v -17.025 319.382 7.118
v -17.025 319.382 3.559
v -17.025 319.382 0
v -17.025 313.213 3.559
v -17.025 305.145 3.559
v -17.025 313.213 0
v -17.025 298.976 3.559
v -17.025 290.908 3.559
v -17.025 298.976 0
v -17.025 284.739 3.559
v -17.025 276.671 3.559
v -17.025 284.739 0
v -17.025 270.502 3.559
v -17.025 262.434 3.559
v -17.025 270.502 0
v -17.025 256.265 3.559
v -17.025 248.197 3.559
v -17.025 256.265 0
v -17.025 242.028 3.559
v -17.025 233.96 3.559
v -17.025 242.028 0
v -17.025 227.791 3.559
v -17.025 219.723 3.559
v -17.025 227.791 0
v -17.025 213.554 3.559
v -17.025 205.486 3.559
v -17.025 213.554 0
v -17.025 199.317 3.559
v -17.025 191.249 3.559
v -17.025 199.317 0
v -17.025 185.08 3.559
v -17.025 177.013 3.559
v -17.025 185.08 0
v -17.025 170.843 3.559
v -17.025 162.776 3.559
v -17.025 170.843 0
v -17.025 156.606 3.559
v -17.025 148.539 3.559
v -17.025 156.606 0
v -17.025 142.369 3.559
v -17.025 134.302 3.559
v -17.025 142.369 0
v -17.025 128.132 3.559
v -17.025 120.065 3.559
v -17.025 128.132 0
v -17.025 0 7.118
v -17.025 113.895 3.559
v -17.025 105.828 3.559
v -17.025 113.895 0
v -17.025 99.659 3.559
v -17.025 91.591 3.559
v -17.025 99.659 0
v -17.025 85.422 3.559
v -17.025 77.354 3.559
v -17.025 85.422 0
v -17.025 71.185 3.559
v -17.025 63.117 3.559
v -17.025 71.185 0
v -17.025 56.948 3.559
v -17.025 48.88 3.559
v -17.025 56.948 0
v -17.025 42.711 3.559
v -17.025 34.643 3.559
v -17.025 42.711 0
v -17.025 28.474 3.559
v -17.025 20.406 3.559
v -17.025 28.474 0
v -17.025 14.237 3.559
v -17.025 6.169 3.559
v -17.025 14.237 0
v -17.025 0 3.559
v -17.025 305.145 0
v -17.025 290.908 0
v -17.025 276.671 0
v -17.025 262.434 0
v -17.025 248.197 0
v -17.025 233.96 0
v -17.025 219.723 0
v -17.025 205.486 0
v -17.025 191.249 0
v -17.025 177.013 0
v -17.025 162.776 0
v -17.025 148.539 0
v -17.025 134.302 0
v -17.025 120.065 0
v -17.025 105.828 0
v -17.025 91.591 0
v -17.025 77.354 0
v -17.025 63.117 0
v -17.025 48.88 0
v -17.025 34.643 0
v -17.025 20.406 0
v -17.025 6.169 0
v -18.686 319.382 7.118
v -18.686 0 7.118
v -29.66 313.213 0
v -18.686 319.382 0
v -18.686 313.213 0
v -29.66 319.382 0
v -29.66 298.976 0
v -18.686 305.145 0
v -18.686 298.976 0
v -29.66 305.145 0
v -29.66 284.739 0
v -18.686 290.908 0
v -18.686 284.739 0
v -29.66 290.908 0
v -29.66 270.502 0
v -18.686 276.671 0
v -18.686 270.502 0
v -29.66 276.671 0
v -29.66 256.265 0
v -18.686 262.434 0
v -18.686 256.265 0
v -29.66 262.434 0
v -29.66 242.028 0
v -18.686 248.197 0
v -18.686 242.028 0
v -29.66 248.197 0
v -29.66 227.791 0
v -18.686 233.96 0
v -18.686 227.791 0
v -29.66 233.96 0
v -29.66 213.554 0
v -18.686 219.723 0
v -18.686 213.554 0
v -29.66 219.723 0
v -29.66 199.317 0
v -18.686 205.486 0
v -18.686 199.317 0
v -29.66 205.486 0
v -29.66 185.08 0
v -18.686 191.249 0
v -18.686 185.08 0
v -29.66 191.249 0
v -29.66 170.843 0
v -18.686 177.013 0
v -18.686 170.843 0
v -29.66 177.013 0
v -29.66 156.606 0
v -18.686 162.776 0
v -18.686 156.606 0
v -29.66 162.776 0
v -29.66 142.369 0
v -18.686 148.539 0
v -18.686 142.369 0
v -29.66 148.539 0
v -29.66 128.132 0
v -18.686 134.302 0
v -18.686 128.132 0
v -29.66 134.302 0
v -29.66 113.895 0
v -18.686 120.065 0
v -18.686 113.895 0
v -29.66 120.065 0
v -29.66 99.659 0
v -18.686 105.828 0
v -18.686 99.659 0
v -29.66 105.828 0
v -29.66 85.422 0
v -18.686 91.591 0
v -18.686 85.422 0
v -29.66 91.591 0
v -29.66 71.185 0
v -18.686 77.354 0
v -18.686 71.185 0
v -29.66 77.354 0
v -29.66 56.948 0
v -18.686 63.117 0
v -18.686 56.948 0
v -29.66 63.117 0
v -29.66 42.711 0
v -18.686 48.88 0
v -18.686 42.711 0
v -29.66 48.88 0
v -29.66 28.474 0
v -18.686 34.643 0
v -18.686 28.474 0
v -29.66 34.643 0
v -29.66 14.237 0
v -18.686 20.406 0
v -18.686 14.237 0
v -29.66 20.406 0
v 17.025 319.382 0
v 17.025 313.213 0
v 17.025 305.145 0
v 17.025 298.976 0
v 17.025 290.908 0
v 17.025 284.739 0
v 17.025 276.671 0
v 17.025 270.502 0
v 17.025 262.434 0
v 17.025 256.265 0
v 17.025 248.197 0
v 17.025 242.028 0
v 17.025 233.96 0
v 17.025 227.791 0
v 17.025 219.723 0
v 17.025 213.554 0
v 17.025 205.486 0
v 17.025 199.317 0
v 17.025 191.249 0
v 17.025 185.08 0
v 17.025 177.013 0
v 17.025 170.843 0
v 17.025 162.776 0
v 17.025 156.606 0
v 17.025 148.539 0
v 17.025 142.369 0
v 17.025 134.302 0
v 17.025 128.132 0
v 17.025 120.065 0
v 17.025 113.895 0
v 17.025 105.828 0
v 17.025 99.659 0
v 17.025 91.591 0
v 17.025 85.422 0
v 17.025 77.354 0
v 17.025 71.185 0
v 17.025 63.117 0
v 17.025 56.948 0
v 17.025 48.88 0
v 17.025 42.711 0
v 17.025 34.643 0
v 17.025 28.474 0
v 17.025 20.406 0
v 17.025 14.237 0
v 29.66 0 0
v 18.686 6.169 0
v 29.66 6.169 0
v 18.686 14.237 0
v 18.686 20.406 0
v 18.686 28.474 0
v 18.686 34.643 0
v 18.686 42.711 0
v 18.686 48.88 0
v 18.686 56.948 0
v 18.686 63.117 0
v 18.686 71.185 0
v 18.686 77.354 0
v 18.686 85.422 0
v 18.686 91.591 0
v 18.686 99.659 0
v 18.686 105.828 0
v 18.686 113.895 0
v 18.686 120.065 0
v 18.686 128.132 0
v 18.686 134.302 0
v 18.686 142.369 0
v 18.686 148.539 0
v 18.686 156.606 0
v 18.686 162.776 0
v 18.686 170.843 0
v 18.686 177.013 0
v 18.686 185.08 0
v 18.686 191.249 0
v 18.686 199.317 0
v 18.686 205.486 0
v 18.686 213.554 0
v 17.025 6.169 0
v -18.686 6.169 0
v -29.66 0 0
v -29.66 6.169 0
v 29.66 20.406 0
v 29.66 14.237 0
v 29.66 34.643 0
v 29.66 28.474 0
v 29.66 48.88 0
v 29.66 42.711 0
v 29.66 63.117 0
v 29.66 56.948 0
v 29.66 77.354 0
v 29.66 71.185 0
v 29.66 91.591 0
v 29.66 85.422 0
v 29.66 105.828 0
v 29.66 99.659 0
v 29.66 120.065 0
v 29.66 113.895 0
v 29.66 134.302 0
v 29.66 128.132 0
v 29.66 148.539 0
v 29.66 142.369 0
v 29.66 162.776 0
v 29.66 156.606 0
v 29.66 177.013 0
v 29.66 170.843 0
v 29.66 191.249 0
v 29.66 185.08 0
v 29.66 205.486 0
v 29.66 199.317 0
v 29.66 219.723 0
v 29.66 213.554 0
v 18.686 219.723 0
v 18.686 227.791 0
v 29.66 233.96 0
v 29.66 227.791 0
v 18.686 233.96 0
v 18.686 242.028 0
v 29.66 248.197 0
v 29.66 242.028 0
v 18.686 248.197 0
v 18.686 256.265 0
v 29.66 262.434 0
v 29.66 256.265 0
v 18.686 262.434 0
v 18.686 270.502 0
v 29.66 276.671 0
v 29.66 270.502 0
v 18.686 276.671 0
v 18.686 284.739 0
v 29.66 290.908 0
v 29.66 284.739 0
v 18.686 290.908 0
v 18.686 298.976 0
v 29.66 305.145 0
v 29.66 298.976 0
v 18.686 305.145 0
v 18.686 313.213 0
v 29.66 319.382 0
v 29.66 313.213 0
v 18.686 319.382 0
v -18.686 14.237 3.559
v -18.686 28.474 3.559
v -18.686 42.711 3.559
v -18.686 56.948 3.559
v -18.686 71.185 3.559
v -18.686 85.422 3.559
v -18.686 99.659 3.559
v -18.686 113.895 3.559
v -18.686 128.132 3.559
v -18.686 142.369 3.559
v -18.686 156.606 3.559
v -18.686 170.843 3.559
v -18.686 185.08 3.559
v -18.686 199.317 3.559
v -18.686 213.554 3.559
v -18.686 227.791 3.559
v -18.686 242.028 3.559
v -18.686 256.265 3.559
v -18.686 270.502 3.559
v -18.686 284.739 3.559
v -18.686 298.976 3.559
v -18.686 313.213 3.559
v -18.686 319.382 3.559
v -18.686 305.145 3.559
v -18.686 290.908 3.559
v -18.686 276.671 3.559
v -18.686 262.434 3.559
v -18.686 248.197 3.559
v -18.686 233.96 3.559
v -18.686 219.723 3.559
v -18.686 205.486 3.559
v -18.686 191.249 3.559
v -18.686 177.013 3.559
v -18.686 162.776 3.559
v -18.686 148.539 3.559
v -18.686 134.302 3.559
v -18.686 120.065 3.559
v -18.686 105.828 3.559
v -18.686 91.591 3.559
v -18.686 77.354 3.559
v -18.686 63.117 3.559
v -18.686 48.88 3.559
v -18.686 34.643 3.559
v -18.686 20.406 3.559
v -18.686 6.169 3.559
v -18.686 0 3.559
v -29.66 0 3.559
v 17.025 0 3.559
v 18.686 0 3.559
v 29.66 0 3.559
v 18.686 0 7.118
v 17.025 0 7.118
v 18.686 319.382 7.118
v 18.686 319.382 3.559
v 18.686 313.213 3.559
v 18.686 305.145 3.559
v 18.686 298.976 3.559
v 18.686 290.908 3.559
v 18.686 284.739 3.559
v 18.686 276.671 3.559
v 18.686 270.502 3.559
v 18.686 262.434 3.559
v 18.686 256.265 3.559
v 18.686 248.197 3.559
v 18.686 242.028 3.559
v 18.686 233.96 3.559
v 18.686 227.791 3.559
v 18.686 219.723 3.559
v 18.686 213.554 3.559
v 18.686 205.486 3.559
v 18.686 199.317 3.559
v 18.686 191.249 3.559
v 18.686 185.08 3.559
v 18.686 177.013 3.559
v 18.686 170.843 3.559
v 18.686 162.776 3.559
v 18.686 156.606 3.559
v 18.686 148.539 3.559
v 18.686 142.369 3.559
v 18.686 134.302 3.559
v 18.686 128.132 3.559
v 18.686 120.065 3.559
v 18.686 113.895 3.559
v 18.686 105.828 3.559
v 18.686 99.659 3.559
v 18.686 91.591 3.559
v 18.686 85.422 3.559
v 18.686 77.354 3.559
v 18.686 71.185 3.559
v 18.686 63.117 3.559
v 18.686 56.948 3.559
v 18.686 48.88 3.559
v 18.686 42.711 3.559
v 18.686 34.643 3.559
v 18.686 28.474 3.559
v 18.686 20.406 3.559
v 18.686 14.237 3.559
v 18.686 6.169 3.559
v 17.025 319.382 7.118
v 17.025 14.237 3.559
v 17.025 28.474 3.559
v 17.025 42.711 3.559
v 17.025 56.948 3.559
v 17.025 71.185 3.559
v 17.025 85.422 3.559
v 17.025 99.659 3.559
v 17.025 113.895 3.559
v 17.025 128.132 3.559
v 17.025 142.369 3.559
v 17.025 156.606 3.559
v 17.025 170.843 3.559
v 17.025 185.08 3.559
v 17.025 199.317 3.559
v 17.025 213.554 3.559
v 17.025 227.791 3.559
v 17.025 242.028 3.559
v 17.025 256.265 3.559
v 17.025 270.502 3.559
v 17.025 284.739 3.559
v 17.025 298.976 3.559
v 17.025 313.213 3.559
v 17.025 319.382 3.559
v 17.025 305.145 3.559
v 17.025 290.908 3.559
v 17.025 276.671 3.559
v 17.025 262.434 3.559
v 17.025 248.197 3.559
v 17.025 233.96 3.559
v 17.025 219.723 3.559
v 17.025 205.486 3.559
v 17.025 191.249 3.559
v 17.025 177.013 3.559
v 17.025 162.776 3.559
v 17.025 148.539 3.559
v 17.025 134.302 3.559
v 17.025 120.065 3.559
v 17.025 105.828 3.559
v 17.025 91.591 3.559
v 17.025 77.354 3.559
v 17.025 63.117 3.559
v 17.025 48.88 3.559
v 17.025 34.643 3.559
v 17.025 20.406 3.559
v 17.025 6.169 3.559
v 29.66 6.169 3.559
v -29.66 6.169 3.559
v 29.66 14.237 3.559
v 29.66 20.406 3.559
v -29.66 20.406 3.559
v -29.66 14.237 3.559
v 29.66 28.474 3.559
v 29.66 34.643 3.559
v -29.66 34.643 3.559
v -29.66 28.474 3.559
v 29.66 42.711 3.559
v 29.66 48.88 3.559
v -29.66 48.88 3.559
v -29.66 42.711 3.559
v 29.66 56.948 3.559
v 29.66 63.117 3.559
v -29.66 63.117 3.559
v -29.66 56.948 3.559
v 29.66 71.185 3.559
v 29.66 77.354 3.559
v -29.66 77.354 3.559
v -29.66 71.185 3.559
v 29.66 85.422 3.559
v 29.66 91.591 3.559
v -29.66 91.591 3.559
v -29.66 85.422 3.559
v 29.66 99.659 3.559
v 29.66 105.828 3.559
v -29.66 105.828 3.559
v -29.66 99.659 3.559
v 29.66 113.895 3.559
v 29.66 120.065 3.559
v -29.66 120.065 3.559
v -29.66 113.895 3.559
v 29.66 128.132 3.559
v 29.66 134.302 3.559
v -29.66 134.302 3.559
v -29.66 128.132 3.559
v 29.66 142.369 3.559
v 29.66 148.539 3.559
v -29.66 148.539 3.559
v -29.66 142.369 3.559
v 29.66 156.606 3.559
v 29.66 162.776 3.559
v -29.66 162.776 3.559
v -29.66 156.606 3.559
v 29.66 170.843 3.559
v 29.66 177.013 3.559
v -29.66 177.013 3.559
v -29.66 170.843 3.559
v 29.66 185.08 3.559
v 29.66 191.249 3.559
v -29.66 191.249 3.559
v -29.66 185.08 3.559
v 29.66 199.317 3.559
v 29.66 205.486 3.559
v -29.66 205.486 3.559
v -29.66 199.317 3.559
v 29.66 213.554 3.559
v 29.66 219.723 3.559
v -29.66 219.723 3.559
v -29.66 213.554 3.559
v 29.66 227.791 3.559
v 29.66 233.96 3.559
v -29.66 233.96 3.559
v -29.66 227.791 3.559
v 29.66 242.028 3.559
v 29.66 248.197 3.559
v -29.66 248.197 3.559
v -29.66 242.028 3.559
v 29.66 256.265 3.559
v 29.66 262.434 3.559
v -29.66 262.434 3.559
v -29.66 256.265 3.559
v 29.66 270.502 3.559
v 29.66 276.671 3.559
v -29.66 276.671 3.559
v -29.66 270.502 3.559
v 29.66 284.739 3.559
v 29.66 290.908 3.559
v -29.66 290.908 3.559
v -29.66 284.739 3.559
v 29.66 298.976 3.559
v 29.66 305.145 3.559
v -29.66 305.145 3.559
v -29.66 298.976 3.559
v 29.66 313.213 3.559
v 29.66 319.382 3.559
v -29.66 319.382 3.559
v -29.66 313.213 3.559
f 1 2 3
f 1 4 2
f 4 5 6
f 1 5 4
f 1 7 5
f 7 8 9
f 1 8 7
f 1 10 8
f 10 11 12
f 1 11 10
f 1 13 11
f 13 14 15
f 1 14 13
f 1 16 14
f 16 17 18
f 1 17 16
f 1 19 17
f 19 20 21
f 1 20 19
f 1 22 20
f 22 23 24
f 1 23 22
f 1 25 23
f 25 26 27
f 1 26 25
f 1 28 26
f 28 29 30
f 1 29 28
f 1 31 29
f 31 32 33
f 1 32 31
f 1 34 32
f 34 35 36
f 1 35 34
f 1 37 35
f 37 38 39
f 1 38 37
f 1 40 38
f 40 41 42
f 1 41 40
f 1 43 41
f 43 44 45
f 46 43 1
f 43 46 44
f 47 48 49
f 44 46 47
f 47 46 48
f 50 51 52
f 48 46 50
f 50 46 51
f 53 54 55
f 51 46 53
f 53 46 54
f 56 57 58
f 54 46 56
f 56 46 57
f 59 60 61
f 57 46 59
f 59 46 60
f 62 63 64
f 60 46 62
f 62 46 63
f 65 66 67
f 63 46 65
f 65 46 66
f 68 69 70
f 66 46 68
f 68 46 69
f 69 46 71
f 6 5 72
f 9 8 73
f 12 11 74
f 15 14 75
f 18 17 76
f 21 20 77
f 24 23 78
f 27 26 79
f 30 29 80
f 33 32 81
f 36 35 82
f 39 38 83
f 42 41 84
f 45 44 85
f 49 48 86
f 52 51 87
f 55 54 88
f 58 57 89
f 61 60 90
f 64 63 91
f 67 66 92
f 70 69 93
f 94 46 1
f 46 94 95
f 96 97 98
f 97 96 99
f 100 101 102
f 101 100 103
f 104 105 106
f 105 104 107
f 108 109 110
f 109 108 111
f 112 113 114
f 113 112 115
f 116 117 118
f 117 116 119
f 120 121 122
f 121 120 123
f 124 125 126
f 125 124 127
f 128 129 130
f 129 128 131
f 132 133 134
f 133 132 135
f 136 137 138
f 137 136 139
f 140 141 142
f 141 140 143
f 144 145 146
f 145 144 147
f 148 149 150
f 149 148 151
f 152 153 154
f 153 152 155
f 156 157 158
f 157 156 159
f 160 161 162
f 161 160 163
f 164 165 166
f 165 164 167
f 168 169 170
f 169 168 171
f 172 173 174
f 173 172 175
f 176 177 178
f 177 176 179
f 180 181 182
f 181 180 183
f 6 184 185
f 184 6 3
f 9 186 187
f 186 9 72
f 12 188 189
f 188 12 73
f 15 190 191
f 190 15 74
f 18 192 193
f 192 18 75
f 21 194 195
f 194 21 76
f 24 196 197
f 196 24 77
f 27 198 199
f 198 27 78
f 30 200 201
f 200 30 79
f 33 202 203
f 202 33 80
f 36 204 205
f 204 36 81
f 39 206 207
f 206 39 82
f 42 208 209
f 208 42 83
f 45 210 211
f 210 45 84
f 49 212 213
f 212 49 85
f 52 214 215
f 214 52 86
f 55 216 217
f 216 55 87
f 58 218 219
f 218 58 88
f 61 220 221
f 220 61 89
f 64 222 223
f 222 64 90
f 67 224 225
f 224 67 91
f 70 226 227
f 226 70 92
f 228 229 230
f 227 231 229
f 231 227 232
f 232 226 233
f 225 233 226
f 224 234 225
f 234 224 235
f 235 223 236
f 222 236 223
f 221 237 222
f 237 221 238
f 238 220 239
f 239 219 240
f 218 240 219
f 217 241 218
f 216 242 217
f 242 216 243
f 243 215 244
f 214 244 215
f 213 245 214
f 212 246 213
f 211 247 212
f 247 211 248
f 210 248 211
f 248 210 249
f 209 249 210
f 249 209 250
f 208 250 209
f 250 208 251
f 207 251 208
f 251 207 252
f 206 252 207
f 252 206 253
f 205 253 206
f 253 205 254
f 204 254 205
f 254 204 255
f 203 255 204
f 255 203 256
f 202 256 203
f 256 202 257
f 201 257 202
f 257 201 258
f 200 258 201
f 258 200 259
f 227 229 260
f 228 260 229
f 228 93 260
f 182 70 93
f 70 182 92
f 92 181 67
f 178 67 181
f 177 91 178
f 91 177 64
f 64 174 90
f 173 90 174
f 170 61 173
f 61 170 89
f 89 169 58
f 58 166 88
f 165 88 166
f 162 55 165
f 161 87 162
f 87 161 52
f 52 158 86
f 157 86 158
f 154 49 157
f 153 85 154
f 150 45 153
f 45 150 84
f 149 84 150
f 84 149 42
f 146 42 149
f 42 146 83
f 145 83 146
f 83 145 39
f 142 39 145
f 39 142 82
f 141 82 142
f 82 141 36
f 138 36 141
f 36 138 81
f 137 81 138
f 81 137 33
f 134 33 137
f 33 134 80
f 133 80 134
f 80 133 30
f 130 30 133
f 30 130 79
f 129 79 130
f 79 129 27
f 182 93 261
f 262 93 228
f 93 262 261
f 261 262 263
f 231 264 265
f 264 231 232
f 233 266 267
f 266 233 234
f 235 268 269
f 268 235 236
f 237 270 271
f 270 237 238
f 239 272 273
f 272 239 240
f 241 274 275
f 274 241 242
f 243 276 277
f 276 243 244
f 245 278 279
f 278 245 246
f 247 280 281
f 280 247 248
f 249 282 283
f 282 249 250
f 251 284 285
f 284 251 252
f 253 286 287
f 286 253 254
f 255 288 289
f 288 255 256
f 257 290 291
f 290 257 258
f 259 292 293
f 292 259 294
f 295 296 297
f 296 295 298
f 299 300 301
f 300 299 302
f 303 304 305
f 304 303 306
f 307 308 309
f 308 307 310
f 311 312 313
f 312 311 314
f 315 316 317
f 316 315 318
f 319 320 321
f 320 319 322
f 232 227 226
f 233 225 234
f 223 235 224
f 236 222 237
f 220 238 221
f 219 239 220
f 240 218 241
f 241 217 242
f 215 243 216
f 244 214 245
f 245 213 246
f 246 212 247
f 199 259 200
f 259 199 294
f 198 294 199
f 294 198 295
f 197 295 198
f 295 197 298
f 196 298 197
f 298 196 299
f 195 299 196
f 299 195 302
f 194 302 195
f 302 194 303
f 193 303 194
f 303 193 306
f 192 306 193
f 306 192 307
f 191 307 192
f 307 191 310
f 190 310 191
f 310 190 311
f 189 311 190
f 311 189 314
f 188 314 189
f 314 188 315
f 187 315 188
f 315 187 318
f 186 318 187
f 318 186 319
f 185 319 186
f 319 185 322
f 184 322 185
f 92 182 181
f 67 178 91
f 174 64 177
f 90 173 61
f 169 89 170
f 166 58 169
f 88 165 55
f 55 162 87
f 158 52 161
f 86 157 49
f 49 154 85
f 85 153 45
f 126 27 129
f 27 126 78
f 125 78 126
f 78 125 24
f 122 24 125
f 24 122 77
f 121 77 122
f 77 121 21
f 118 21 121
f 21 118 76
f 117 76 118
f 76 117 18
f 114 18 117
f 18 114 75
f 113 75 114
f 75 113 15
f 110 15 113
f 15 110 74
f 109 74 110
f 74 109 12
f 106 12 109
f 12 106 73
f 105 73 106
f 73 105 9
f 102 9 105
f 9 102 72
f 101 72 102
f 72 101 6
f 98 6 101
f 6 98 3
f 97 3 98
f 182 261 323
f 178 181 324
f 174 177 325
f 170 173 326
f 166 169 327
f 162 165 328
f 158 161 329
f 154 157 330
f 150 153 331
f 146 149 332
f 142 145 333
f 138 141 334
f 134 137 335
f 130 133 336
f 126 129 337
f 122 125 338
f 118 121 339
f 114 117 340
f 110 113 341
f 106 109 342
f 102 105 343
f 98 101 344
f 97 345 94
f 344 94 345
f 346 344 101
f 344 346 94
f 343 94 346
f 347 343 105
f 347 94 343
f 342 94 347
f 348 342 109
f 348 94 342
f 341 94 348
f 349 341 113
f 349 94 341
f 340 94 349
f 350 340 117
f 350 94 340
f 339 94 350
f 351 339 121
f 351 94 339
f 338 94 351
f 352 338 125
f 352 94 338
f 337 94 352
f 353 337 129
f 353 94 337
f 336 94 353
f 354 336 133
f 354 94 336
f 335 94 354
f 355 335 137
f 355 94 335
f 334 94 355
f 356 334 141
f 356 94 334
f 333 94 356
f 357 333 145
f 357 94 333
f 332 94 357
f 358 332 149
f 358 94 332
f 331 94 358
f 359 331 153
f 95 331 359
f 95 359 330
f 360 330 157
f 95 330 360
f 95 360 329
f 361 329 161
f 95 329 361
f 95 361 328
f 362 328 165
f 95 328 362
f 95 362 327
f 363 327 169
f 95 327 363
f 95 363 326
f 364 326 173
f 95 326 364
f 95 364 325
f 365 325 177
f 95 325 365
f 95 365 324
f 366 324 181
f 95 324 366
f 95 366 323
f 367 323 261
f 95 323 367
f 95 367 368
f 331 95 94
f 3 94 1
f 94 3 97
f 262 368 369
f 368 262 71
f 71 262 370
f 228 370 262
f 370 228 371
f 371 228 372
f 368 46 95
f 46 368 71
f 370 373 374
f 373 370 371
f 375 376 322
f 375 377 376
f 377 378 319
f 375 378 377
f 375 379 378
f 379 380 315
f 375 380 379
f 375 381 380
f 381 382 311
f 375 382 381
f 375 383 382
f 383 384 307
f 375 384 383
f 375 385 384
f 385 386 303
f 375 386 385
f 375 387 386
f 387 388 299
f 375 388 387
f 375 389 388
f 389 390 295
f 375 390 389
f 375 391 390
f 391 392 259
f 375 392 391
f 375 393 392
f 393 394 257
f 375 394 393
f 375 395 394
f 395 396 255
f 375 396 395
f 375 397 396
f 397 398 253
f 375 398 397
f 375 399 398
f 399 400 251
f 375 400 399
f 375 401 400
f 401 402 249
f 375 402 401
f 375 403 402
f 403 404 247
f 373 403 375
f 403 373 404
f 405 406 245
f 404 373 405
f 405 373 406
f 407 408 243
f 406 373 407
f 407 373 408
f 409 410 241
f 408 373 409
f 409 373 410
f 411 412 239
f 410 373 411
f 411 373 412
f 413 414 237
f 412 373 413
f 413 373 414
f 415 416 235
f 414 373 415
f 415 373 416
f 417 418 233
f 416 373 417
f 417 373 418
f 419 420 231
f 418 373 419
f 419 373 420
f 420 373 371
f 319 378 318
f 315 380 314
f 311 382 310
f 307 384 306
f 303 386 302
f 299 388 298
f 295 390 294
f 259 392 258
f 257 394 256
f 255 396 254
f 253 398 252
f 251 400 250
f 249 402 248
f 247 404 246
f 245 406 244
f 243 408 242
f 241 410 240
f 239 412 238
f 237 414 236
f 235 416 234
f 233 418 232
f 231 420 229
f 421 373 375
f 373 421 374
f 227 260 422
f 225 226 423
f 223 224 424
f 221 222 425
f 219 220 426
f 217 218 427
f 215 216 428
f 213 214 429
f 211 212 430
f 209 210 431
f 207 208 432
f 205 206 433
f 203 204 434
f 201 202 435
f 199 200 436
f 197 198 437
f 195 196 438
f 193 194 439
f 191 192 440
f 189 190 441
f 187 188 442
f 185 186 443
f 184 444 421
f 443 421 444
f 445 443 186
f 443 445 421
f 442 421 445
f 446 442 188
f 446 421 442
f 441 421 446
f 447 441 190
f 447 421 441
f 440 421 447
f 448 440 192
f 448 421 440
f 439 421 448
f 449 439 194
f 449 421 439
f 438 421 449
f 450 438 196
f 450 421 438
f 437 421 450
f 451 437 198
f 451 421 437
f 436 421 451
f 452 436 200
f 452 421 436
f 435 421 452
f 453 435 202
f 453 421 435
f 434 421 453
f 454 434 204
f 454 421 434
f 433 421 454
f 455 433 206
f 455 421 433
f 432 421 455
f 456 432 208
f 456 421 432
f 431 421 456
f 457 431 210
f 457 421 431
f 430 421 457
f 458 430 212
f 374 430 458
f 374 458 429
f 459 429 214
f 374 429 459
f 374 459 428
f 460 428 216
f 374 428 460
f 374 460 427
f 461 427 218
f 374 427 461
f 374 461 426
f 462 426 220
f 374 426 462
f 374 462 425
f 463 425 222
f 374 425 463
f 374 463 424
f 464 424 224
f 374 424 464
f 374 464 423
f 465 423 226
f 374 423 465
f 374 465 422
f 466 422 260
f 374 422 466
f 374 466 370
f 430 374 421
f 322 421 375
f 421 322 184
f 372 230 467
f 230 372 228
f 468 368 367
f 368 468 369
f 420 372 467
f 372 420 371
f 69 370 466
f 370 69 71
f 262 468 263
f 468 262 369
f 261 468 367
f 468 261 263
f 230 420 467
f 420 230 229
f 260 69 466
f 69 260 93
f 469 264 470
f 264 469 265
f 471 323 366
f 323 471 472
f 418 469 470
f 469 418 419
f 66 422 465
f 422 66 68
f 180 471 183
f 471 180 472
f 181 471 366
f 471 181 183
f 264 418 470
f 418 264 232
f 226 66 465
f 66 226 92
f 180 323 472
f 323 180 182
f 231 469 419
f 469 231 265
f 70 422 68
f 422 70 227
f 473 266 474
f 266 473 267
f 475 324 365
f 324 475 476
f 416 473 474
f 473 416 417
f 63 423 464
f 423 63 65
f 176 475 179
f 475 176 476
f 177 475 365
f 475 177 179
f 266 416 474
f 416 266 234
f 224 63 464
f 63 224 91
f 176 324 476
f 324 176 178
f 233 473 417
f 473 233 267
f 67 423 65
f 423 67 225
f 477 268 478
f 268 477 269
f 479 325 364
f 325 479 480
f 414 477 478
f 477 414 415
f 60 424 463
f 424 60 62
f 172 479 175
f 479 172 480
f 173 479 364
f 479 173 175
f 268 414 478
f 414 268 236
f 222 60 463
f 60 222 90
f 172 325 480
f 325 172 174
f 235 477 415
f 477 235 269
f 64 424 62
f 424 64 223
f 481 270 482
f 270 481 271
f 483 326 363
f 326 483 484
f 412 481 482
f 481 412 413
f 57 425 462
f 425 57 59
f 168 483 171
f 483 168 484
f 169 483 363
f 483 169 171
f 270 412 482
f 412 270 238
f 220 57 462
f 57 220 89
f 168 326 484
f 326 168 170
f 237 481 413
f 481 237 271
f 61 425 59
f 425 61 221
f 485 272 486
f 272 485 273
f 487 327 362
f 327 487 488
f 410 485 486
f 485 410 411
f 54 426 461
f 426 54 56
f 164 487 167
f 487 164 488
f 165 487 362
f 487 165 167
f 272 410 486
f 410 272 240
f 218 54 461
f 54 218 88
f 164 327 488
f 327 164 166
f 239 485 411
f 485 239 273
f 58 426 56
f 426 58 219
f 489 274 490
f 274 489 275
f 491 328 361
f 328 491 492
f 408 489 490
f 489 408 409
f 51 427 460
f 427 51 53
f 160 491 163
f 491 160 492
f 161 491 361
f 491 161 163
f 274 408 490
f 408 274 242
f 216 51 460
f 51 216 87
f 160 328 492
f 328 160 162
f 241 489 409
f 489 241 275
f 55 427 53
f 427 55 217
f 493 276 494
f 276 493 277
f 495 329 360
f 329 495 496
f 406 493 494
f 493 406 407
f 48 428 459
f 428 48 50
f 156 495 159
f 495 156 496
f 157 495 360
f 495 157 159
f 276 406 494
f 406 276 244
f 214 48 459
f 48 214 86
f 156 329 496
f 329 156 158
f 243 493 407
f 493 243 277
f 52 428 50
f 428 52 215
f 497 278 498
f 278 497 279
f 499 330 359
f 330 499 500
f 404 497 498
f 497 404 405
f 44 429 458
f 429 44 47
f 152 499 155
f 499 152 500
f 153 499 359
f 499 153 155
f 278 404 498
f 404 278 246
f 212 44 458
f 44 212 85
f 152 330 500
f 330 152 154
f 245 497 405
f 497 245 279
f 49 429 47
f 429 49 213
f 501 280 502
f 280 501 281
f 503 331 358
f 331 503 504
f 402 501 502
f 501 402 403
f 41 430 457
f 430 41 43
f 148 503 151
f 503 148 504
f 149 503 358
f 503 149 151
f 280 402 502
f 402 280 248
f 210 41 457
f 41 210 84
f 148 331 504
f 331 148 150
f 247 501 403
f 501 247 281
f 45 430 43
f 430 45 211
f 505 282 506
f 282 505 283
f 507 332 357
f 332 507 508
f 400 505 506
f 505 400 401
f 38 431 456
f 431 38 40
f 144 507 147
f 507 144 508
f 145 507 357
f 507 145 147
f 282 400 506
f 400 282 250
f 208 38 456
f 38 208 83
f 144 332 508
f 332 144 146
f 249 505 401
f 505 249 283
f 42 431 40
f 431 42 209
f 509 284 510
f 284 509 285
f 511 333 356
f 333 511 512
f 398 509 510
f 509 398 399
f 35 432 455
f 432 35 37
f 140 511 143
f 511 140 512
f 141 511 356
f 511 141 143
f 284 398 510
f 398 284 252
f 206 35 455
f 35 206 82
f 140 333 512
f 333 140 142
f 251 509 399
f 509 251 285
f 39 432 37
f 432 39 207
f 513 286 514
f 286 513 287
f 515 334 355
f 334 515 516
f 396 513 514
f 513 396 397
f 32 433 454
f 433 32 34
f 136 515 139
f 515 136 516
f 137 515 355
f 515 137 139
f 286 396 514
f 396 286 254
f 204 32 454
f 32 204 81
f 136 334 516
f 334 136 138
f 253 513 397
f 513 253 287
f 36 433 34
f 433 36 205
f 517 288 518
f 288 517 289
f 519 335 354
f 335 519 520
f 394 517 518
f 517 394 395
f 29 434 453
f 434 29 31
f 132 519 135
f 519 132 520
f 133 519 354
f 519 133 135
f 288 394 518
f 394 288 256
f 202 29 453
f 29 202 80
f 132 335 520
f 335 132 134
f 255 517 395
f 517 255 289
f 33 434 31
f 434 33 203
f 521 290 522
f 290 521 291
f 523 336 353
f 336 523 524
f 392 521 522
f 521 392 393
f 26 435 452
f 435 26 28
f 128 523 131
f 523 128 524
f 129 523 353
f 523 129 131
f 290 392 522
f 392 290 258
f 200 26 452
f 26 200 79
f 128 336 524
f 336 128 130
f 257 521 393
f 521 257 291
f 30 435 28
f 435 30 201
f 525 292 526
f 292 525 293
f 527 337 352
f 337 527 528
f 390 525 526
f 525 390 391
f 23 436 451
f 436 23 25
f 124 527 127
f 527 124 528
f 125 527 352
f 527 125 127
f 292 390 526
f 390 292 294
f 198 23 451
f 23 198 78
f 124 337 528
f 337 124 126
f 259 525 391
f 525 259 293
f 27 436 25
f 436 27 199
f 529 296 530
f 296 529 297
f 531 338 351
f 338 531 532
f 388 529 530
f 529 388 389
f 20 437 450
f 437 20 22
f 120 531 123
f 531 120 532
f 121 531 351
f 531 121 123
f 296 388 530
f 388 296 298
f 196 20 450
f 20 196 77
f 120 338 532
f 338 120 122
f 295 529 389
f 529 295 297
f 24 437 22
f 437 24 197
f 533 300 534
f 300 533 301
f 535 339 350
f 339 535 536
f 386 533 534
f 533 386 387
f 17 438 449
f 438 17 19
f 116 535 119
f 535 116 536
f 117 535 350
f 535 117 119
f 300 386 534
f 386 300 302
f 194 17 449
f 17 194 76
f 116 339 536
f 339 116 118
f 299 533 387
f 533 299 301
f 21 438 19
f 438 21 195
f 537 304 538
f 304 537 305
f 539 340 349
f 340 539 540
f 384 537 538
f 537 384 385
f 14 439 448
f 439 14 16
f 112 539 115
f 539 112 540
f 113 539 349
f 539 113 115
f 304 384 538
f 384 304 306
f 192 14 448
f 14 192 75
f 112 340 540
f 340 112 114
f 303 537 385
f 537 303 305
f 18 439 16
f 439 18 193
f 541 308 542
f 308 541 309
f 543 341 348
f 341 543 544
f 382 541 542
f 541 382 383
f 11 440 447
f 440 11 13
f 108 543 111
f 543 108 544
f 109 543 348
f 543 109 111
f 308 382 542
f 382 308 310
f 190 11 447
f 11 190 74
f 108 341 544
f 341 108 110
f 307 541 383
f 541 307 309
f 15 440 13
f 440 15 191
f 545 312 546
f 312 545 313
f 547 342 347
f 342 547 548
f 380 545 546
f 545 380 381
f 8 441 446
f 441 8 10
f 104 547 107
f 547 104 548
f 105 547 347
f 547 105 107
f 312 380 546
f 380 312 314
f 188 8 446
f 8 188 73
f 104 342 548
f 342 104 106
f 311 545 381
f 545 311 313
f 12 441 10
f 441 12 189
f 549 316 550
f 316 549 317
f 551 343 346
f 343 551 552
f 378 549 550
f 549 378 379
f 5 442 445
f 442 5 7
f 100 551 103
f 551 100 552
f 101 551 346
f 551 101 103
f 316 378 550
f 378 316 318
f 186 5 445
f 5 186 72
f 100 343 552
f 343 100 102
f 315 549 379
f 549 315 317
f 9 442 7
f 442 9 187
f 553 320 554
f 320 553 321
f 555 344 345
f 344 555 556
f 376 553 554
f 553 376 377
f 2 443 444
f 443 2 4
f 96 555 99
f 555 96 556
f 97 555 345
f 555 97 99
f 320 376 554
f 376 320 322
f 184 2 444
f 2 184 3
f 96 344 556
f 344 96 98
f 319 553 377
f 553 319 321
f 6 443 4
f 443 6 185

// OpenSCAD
module tracks(length)
{
  scale_span = 30.45 + 2*2.3 - 2*0.5;
  real_span = 1435;
  scale_down = scale_span / real_span;

  sleeper_size = scale_down * [2500, 260, 150];
  sleeper_span = scale_down * 600;

  track_size = scale_down * [70, 0, 150] + [0, length, 0];
  track_span = scale_down * 1435;

  assert(track_span == scale_span);

  module sleeper()
  {
    translate([-sleeper_size.x/2, 0, 0])
      cube(sleeper_size);
  }

  module track(dir)
  {
    dx = dir < 0 ? -track_size.x : 0;
    translate([dx + dir*track_span/2, 0, 0])
      cube(track_size + [0, 0, sleeper_size.z]);
  }

  for(dir = [-1, +1])
    track(dir);
  for(dy = [0 : sleeper_span : length])
    translate([0, dy, 0])
      sleeper();
}


tracks(length=319.382); // ~320mm, with a nice, flat finish at the end
